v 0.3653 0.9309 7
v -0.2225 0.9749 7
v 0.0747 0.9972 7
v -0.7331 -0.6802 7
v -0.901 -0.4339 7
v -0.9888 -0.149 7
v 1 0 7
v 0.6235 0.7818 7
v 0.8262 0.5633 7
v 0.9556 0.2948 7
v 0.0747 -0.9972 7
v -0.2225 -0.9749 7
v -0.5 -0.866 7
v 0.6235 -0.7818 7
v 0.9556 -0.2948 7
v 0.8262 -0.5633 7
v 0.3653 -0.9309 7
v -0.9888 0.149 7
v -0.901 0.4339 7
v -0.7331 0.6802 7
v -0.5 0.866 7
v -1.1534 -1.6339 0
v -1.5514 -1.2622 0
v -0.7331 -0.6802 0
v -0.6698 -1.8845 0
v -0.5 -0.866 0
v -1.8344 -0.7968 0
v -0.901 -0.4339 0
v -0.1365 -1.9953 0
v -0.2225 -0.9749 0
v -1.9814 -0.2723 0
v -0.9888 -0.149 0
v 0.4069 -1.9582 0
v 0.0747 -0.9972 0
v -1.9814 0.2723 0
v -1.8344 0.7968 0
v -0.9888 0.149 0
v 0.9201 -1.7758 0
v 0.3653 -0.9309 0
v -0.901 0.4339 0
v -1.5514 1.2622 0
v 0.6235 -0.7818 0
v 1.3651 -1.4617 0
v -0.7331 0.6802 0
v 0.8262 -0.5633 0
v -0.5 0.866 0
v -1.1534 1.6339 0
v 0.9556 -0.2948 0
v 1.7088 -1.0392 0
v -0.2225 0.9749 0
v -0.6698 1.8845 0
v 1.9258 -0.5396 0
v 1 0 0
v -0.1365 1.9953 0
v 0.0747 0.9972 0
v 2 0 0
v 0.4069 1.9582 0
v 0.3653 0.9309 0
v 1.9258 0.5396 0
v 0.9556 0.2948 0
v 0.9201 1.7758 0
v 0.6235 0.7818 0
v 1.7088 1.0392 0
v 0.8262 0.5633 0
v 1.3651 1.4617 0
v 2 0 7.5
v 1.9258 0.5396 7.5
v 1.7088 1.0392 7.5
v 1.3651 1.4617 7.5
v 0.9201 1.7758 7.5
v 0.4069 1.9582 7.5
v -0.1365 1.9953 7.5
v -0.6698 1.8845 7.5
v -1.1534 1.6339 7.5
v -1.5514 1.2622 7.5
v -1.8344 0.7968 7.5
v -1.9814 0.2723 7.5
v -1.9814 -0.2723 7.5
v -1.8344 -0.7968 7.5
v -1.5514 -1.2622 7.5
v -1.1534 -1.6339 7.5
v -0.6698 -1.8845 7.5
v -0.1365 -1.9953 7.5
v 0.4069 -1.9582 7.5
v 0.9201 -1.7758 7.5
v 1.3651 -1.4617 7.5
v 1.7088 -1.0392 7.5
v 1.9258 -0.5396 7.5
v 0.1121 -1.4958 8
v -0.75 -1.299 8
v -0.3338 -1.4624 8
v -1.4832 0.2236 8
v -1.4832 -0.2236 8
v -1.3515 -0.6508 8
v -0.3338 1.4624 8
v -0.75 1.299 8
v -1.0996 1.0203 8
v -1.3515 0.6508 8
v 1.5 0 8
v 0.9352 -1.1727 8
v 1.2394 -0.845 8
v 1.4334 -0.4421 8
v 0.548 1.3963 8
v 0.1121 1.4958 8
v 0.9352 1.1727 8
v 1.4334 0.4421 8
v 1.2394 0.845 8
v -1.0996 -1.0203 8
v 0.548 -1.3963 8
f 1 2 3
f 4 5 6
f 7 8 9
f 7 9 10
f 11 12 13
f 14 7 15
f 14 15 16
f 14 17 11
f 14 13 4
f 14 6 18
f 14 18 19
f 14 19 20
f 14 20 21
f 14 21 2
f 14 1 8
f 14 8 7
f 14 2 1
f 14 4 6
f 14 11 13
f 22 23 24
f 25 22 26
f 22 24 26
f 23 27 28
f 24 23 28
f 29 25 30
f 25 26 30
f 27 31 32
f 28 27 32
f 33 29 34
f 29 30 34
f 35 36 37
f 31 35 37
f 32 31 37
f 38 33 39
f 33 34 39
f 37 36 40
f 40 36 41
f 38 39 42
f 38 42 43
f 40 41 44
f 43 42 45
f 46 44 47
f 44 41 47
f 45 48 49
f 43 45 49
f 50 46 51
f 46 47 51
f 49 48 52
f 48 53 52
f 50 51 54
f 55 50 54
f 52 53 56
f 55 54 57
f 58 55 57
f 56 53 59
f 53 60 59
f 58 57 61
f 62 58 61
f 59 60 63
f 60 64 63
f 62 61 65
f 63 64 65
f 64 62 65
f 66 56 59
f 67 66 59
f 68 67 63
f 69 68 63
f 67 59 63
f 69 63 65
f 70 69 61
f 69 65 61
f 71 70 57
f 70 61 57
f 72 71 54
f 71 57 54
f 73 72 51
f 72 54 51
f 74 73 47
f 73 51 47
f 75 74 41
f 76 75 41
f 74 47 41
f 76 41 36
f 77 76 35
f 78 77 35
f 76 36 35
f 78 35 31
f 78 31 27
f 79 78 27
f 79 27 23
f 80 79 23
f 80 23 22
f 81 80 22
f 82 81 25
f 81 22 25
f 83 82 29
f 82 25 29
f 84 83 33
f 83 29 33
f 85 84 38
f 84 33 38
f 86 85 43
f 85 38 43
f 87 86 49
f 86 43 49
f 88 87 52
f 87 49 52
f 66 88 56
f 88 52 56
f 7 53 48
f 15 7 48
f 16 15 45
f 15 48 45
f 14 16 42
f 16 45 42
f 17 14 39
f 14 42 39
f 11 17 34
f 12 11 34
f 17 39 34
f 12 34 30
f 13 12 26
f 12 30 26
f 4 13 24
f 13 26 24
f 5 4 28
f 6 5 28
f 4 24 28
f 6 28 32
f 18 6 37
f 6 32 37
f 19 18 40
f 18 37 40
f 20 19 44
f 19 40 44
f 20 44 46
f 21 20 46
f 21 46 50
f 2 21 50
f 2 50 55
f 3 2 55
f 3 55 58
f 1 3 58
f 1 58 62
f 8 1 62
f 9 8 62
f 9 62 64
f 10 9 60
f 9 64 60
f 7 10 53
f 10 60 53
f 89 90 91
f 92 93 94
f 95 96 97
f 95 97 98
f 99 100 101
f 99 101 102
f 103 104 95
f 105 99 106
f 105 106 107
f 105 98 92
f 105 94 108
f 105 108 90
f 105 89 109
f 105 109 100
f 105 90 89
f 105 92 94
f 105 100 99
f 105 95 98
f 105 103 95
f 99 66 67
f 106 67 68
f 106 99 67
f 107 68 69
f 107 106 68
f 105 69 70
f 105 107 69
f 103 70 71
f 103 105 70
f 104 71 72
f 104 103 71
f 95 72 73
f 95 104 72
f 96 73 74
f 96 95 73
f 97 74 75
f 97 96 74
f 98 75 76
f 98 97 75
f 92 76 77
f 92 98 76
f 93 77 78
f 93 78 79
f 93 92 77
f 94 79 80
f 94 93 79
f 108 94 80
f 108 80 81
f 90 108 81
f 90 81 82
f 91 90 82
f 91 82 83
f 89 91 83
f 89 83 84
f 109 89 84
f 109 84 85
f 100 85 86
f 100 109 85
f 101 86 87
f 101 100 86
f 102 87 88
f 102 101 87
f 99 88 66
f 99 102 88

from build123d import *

# Parameters (mm, degrees)
F0_R     = 2
F1_DEPTH = 8
F2_R     = 1
F3_DEPTH = 7
F4_SIZE  = 0.5


with BuildPart() as f1:
    # F0 (on Top) → F1 (new body)
    with BuildSketch(Plane.XY):
        Circle(F0_R)
    extrude(amount=F1_DEPTH)

    # F2 (on face) → F3 (cut)
    with BuildSketch(Plane(origin=(0, 0, 0), x_dir=(1, 0, 0), z_dir=(0, 0, -1))):
        Circle(F2_R)
    extrude(amount=-F3_DEPTH, mode=Mode.SUBTRACT)

    # F4
    f4_edges = [f1.edges().sort_by_distance(p)[0] for p in [
        (-2, 0, 8),
    ]]
    chamfer(f4_edges, length=F4_SIZE)


solid = f1.part
